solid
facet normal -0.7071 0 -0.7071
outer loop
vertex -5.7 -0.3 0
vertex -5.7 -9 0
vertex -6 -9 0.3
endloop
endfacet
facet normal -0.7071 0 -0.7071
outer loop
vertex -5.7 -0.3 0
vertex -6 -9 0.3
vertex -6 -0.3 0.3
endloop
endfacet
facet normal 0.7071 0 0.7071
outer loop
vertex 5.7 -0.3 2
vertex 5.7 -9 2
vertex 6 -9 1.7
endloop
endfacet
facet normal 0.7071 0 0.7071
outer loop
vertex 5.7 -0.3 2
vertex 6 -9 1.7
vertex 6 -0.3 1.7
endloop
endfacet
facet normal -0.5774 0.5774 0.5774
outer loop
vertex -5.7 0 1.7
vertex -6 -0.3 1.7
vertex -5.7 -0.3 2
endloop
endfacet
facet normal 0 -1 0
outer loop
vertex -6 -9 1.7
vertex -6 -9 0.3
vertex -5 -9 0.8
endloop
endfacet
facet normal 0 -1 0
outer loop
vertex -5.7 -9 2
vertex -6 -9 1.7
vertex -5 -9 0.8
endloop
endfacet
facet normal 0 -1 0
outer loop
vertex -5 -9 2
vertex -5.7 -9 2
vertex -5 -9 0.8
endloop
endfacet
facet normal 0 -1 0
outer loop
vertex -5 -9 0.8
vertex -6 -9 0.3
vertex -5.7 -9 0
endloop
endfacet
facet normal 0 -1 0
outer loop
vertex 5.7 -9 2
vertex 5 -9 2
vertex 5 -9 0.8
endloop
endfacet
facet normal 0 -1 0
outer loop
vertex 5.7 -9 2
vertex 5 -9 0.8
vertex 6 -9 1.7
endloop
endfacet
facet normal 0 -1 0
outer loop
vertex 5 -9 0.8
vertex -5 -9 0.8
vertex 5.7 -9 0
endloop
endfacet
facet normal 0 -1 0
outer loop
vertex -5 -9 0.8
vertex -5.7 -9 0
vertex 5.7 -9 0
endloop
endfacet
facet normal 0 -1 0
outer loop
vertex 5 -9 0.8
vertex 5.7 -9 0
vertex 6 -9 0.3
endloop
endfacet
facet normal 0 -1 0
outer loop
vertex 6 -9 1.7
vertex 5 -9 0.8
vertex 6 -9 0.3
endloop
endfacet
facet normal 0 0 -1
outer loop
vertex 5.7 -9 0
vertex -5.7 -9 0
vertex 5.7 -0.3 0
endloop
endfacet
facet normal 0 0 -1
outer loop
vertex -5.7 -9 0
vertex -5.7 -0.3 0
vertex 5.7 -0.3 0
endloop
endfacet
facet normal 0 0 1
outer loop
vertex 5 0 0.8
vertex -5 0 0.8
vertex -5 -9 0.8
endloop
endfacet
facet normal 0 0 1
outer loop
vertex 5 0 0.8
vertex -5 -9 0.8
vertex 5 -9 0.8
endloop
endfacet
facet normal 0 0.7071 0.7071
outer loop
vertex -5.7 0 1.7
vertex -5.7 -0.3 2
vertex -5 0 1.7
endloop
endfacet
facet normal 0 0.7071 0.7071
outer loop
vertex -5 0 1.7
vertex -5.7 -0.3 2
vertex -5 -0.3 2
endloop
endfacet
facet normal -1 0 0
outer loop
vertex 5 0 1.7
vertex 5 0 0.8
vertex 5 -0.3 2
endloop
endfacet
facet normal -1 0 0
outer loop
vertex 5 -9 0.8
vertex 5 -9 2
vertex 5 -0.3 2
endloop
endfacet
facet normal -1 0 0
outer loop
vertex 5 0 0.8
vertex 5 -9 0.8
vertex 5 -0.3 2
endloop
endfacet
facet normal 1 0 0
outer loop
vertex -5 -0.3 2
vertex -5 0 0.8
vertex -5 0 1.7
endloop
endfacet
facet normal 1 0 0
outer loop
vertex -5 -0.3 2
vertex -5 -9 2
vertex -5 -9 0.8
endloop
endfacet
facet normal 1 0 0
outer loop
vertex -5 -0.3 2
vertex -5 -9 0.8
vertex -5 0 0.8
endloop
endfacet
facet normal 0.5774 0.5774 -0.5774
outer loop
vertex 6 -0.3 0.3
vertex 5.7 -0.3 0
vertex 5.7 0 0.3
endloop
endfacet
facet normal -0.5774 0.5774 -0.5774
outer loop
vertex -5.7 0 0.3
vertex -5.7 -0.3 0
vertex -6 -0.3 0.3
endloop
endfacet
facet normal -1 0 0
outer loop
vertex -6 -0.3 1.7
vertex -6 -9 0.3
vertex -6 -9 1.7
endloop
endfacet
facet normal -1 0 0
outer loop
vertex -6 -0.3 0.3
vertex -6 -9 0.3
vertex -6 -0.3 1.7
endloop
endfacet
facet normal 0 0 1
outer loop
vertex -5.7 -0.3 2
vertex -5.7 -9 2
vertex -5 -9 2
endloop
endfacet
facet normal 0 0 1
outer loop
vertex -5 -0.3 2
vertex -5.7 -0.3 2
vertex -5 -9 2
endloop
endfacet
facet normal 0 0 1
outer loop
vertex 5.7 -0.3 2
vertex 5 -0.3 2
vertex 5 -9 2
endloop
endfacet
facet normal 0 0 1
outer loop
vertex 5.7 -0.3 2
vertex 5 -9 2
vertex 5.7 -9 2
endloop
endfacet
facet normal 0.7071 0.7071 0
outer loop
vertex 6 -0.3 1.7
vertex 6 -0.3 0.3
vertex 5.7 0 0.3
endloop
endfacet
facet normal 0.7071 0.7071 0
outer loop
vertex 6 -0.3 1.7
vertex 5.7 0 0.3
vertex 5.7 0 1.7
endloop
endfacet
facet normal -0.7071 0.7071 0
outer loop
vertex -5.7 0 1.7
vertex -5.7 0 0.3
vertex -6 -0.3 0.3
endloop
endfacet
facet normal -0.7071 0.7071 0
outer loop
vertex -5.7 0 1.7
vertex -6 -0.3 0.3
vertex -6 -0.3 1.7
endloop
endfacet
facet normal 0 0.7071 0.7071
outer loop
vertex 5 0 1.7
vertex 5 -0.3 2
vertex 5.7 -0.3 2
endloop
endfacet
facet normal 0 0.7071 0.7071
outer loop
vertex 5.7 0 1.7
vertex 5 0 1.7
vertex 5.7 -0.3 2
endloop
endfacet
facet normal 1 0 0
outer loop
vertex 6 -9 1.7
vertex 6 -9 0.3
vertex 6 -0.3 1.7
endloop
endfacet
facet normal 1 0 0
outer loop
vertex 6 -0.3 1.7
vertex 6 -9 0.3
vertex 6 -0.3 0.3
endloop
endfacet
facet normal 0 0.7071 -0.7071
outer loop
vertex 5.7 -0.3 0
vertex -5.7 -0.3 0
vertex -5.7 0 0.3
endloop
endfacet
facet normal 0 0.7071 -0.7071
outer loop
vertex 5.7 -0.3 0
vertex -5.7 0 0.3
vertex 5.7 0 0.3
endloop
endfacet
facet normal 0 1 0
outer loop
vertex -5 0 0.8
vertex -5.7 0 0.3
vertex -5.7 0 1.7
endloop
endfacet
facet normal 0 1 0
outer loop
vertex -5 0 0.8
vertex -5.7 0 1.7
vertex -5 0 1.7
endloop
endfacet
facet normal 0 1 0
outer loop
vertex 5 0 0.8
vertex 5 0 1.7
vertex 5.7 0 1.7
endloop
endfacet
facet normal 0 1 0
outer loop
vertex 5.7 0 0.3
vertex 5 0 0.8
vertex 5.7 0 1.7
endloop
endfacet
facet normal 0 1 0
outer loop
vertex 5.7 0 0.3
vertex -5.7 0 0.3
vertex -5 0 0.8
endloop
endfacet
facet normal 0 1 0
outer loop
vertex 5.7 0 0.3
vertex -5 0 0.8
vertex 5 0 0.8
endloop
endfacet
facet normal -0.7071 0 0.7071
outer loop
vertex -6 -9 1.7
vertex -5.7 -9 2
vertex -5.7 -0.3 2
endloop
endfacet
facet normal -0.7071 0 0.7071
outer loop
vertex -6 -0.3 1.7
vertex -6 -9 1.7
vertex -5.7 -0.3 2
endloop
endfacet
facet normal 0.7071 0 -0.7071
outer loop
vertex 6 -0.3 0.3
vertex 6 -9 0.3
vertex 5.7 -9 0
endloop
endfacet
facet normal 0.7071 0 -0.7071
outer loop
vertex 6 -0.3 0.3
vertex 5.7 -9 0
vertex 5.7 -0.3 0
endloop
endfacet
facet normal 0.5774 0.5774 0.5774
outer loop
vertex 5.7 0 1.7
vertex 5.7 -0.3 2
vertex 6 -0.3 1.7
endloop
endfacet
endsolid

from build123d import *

# Parameters (mm, degrees)
F0_W     = 12
F0_H     = 9
F1_DEPTH = 2
F2_W     = 10
F2_H     = 9
F3_DEPTH = 1.2
F4_SIZE  = 0.3


with BuildPart() as f1:
    # F0 (on Top) → F1 (new body)
    with BuildSketch(Plane.XY):
        with Locations((0, -4.5)):
            Rectangle(F0_W, F0_H)
    extrude(amount=F1_DEPTH)

    # F2 (on face) → F3 (cut)
    with BuildSketch(Plane.XY.offset(2)):
        with Locations((0, -4.5)):
            Rectangle(F2_W, F2_H)
    extrude(amount=-F3_DEPTH, mode=Mode.SUBTRACT)

    # F4
    f4_edges = [f1.edges().sort_by_distance(p)[0] for p in [
        (-6, -4.5, 2),
        (6, -4.5, 2),
        (6, -4.5, 0),
        (-6, -4.5, 0),
        (0, 0, 0),
        (-6, 0, 1),
        (-5.5, 0, 2),
        (5.5, 0, 2),
        (6, 0, 1),
    ]]
    chamfer(f4_edges, length=F4_SIZE)


solid = f1.part
